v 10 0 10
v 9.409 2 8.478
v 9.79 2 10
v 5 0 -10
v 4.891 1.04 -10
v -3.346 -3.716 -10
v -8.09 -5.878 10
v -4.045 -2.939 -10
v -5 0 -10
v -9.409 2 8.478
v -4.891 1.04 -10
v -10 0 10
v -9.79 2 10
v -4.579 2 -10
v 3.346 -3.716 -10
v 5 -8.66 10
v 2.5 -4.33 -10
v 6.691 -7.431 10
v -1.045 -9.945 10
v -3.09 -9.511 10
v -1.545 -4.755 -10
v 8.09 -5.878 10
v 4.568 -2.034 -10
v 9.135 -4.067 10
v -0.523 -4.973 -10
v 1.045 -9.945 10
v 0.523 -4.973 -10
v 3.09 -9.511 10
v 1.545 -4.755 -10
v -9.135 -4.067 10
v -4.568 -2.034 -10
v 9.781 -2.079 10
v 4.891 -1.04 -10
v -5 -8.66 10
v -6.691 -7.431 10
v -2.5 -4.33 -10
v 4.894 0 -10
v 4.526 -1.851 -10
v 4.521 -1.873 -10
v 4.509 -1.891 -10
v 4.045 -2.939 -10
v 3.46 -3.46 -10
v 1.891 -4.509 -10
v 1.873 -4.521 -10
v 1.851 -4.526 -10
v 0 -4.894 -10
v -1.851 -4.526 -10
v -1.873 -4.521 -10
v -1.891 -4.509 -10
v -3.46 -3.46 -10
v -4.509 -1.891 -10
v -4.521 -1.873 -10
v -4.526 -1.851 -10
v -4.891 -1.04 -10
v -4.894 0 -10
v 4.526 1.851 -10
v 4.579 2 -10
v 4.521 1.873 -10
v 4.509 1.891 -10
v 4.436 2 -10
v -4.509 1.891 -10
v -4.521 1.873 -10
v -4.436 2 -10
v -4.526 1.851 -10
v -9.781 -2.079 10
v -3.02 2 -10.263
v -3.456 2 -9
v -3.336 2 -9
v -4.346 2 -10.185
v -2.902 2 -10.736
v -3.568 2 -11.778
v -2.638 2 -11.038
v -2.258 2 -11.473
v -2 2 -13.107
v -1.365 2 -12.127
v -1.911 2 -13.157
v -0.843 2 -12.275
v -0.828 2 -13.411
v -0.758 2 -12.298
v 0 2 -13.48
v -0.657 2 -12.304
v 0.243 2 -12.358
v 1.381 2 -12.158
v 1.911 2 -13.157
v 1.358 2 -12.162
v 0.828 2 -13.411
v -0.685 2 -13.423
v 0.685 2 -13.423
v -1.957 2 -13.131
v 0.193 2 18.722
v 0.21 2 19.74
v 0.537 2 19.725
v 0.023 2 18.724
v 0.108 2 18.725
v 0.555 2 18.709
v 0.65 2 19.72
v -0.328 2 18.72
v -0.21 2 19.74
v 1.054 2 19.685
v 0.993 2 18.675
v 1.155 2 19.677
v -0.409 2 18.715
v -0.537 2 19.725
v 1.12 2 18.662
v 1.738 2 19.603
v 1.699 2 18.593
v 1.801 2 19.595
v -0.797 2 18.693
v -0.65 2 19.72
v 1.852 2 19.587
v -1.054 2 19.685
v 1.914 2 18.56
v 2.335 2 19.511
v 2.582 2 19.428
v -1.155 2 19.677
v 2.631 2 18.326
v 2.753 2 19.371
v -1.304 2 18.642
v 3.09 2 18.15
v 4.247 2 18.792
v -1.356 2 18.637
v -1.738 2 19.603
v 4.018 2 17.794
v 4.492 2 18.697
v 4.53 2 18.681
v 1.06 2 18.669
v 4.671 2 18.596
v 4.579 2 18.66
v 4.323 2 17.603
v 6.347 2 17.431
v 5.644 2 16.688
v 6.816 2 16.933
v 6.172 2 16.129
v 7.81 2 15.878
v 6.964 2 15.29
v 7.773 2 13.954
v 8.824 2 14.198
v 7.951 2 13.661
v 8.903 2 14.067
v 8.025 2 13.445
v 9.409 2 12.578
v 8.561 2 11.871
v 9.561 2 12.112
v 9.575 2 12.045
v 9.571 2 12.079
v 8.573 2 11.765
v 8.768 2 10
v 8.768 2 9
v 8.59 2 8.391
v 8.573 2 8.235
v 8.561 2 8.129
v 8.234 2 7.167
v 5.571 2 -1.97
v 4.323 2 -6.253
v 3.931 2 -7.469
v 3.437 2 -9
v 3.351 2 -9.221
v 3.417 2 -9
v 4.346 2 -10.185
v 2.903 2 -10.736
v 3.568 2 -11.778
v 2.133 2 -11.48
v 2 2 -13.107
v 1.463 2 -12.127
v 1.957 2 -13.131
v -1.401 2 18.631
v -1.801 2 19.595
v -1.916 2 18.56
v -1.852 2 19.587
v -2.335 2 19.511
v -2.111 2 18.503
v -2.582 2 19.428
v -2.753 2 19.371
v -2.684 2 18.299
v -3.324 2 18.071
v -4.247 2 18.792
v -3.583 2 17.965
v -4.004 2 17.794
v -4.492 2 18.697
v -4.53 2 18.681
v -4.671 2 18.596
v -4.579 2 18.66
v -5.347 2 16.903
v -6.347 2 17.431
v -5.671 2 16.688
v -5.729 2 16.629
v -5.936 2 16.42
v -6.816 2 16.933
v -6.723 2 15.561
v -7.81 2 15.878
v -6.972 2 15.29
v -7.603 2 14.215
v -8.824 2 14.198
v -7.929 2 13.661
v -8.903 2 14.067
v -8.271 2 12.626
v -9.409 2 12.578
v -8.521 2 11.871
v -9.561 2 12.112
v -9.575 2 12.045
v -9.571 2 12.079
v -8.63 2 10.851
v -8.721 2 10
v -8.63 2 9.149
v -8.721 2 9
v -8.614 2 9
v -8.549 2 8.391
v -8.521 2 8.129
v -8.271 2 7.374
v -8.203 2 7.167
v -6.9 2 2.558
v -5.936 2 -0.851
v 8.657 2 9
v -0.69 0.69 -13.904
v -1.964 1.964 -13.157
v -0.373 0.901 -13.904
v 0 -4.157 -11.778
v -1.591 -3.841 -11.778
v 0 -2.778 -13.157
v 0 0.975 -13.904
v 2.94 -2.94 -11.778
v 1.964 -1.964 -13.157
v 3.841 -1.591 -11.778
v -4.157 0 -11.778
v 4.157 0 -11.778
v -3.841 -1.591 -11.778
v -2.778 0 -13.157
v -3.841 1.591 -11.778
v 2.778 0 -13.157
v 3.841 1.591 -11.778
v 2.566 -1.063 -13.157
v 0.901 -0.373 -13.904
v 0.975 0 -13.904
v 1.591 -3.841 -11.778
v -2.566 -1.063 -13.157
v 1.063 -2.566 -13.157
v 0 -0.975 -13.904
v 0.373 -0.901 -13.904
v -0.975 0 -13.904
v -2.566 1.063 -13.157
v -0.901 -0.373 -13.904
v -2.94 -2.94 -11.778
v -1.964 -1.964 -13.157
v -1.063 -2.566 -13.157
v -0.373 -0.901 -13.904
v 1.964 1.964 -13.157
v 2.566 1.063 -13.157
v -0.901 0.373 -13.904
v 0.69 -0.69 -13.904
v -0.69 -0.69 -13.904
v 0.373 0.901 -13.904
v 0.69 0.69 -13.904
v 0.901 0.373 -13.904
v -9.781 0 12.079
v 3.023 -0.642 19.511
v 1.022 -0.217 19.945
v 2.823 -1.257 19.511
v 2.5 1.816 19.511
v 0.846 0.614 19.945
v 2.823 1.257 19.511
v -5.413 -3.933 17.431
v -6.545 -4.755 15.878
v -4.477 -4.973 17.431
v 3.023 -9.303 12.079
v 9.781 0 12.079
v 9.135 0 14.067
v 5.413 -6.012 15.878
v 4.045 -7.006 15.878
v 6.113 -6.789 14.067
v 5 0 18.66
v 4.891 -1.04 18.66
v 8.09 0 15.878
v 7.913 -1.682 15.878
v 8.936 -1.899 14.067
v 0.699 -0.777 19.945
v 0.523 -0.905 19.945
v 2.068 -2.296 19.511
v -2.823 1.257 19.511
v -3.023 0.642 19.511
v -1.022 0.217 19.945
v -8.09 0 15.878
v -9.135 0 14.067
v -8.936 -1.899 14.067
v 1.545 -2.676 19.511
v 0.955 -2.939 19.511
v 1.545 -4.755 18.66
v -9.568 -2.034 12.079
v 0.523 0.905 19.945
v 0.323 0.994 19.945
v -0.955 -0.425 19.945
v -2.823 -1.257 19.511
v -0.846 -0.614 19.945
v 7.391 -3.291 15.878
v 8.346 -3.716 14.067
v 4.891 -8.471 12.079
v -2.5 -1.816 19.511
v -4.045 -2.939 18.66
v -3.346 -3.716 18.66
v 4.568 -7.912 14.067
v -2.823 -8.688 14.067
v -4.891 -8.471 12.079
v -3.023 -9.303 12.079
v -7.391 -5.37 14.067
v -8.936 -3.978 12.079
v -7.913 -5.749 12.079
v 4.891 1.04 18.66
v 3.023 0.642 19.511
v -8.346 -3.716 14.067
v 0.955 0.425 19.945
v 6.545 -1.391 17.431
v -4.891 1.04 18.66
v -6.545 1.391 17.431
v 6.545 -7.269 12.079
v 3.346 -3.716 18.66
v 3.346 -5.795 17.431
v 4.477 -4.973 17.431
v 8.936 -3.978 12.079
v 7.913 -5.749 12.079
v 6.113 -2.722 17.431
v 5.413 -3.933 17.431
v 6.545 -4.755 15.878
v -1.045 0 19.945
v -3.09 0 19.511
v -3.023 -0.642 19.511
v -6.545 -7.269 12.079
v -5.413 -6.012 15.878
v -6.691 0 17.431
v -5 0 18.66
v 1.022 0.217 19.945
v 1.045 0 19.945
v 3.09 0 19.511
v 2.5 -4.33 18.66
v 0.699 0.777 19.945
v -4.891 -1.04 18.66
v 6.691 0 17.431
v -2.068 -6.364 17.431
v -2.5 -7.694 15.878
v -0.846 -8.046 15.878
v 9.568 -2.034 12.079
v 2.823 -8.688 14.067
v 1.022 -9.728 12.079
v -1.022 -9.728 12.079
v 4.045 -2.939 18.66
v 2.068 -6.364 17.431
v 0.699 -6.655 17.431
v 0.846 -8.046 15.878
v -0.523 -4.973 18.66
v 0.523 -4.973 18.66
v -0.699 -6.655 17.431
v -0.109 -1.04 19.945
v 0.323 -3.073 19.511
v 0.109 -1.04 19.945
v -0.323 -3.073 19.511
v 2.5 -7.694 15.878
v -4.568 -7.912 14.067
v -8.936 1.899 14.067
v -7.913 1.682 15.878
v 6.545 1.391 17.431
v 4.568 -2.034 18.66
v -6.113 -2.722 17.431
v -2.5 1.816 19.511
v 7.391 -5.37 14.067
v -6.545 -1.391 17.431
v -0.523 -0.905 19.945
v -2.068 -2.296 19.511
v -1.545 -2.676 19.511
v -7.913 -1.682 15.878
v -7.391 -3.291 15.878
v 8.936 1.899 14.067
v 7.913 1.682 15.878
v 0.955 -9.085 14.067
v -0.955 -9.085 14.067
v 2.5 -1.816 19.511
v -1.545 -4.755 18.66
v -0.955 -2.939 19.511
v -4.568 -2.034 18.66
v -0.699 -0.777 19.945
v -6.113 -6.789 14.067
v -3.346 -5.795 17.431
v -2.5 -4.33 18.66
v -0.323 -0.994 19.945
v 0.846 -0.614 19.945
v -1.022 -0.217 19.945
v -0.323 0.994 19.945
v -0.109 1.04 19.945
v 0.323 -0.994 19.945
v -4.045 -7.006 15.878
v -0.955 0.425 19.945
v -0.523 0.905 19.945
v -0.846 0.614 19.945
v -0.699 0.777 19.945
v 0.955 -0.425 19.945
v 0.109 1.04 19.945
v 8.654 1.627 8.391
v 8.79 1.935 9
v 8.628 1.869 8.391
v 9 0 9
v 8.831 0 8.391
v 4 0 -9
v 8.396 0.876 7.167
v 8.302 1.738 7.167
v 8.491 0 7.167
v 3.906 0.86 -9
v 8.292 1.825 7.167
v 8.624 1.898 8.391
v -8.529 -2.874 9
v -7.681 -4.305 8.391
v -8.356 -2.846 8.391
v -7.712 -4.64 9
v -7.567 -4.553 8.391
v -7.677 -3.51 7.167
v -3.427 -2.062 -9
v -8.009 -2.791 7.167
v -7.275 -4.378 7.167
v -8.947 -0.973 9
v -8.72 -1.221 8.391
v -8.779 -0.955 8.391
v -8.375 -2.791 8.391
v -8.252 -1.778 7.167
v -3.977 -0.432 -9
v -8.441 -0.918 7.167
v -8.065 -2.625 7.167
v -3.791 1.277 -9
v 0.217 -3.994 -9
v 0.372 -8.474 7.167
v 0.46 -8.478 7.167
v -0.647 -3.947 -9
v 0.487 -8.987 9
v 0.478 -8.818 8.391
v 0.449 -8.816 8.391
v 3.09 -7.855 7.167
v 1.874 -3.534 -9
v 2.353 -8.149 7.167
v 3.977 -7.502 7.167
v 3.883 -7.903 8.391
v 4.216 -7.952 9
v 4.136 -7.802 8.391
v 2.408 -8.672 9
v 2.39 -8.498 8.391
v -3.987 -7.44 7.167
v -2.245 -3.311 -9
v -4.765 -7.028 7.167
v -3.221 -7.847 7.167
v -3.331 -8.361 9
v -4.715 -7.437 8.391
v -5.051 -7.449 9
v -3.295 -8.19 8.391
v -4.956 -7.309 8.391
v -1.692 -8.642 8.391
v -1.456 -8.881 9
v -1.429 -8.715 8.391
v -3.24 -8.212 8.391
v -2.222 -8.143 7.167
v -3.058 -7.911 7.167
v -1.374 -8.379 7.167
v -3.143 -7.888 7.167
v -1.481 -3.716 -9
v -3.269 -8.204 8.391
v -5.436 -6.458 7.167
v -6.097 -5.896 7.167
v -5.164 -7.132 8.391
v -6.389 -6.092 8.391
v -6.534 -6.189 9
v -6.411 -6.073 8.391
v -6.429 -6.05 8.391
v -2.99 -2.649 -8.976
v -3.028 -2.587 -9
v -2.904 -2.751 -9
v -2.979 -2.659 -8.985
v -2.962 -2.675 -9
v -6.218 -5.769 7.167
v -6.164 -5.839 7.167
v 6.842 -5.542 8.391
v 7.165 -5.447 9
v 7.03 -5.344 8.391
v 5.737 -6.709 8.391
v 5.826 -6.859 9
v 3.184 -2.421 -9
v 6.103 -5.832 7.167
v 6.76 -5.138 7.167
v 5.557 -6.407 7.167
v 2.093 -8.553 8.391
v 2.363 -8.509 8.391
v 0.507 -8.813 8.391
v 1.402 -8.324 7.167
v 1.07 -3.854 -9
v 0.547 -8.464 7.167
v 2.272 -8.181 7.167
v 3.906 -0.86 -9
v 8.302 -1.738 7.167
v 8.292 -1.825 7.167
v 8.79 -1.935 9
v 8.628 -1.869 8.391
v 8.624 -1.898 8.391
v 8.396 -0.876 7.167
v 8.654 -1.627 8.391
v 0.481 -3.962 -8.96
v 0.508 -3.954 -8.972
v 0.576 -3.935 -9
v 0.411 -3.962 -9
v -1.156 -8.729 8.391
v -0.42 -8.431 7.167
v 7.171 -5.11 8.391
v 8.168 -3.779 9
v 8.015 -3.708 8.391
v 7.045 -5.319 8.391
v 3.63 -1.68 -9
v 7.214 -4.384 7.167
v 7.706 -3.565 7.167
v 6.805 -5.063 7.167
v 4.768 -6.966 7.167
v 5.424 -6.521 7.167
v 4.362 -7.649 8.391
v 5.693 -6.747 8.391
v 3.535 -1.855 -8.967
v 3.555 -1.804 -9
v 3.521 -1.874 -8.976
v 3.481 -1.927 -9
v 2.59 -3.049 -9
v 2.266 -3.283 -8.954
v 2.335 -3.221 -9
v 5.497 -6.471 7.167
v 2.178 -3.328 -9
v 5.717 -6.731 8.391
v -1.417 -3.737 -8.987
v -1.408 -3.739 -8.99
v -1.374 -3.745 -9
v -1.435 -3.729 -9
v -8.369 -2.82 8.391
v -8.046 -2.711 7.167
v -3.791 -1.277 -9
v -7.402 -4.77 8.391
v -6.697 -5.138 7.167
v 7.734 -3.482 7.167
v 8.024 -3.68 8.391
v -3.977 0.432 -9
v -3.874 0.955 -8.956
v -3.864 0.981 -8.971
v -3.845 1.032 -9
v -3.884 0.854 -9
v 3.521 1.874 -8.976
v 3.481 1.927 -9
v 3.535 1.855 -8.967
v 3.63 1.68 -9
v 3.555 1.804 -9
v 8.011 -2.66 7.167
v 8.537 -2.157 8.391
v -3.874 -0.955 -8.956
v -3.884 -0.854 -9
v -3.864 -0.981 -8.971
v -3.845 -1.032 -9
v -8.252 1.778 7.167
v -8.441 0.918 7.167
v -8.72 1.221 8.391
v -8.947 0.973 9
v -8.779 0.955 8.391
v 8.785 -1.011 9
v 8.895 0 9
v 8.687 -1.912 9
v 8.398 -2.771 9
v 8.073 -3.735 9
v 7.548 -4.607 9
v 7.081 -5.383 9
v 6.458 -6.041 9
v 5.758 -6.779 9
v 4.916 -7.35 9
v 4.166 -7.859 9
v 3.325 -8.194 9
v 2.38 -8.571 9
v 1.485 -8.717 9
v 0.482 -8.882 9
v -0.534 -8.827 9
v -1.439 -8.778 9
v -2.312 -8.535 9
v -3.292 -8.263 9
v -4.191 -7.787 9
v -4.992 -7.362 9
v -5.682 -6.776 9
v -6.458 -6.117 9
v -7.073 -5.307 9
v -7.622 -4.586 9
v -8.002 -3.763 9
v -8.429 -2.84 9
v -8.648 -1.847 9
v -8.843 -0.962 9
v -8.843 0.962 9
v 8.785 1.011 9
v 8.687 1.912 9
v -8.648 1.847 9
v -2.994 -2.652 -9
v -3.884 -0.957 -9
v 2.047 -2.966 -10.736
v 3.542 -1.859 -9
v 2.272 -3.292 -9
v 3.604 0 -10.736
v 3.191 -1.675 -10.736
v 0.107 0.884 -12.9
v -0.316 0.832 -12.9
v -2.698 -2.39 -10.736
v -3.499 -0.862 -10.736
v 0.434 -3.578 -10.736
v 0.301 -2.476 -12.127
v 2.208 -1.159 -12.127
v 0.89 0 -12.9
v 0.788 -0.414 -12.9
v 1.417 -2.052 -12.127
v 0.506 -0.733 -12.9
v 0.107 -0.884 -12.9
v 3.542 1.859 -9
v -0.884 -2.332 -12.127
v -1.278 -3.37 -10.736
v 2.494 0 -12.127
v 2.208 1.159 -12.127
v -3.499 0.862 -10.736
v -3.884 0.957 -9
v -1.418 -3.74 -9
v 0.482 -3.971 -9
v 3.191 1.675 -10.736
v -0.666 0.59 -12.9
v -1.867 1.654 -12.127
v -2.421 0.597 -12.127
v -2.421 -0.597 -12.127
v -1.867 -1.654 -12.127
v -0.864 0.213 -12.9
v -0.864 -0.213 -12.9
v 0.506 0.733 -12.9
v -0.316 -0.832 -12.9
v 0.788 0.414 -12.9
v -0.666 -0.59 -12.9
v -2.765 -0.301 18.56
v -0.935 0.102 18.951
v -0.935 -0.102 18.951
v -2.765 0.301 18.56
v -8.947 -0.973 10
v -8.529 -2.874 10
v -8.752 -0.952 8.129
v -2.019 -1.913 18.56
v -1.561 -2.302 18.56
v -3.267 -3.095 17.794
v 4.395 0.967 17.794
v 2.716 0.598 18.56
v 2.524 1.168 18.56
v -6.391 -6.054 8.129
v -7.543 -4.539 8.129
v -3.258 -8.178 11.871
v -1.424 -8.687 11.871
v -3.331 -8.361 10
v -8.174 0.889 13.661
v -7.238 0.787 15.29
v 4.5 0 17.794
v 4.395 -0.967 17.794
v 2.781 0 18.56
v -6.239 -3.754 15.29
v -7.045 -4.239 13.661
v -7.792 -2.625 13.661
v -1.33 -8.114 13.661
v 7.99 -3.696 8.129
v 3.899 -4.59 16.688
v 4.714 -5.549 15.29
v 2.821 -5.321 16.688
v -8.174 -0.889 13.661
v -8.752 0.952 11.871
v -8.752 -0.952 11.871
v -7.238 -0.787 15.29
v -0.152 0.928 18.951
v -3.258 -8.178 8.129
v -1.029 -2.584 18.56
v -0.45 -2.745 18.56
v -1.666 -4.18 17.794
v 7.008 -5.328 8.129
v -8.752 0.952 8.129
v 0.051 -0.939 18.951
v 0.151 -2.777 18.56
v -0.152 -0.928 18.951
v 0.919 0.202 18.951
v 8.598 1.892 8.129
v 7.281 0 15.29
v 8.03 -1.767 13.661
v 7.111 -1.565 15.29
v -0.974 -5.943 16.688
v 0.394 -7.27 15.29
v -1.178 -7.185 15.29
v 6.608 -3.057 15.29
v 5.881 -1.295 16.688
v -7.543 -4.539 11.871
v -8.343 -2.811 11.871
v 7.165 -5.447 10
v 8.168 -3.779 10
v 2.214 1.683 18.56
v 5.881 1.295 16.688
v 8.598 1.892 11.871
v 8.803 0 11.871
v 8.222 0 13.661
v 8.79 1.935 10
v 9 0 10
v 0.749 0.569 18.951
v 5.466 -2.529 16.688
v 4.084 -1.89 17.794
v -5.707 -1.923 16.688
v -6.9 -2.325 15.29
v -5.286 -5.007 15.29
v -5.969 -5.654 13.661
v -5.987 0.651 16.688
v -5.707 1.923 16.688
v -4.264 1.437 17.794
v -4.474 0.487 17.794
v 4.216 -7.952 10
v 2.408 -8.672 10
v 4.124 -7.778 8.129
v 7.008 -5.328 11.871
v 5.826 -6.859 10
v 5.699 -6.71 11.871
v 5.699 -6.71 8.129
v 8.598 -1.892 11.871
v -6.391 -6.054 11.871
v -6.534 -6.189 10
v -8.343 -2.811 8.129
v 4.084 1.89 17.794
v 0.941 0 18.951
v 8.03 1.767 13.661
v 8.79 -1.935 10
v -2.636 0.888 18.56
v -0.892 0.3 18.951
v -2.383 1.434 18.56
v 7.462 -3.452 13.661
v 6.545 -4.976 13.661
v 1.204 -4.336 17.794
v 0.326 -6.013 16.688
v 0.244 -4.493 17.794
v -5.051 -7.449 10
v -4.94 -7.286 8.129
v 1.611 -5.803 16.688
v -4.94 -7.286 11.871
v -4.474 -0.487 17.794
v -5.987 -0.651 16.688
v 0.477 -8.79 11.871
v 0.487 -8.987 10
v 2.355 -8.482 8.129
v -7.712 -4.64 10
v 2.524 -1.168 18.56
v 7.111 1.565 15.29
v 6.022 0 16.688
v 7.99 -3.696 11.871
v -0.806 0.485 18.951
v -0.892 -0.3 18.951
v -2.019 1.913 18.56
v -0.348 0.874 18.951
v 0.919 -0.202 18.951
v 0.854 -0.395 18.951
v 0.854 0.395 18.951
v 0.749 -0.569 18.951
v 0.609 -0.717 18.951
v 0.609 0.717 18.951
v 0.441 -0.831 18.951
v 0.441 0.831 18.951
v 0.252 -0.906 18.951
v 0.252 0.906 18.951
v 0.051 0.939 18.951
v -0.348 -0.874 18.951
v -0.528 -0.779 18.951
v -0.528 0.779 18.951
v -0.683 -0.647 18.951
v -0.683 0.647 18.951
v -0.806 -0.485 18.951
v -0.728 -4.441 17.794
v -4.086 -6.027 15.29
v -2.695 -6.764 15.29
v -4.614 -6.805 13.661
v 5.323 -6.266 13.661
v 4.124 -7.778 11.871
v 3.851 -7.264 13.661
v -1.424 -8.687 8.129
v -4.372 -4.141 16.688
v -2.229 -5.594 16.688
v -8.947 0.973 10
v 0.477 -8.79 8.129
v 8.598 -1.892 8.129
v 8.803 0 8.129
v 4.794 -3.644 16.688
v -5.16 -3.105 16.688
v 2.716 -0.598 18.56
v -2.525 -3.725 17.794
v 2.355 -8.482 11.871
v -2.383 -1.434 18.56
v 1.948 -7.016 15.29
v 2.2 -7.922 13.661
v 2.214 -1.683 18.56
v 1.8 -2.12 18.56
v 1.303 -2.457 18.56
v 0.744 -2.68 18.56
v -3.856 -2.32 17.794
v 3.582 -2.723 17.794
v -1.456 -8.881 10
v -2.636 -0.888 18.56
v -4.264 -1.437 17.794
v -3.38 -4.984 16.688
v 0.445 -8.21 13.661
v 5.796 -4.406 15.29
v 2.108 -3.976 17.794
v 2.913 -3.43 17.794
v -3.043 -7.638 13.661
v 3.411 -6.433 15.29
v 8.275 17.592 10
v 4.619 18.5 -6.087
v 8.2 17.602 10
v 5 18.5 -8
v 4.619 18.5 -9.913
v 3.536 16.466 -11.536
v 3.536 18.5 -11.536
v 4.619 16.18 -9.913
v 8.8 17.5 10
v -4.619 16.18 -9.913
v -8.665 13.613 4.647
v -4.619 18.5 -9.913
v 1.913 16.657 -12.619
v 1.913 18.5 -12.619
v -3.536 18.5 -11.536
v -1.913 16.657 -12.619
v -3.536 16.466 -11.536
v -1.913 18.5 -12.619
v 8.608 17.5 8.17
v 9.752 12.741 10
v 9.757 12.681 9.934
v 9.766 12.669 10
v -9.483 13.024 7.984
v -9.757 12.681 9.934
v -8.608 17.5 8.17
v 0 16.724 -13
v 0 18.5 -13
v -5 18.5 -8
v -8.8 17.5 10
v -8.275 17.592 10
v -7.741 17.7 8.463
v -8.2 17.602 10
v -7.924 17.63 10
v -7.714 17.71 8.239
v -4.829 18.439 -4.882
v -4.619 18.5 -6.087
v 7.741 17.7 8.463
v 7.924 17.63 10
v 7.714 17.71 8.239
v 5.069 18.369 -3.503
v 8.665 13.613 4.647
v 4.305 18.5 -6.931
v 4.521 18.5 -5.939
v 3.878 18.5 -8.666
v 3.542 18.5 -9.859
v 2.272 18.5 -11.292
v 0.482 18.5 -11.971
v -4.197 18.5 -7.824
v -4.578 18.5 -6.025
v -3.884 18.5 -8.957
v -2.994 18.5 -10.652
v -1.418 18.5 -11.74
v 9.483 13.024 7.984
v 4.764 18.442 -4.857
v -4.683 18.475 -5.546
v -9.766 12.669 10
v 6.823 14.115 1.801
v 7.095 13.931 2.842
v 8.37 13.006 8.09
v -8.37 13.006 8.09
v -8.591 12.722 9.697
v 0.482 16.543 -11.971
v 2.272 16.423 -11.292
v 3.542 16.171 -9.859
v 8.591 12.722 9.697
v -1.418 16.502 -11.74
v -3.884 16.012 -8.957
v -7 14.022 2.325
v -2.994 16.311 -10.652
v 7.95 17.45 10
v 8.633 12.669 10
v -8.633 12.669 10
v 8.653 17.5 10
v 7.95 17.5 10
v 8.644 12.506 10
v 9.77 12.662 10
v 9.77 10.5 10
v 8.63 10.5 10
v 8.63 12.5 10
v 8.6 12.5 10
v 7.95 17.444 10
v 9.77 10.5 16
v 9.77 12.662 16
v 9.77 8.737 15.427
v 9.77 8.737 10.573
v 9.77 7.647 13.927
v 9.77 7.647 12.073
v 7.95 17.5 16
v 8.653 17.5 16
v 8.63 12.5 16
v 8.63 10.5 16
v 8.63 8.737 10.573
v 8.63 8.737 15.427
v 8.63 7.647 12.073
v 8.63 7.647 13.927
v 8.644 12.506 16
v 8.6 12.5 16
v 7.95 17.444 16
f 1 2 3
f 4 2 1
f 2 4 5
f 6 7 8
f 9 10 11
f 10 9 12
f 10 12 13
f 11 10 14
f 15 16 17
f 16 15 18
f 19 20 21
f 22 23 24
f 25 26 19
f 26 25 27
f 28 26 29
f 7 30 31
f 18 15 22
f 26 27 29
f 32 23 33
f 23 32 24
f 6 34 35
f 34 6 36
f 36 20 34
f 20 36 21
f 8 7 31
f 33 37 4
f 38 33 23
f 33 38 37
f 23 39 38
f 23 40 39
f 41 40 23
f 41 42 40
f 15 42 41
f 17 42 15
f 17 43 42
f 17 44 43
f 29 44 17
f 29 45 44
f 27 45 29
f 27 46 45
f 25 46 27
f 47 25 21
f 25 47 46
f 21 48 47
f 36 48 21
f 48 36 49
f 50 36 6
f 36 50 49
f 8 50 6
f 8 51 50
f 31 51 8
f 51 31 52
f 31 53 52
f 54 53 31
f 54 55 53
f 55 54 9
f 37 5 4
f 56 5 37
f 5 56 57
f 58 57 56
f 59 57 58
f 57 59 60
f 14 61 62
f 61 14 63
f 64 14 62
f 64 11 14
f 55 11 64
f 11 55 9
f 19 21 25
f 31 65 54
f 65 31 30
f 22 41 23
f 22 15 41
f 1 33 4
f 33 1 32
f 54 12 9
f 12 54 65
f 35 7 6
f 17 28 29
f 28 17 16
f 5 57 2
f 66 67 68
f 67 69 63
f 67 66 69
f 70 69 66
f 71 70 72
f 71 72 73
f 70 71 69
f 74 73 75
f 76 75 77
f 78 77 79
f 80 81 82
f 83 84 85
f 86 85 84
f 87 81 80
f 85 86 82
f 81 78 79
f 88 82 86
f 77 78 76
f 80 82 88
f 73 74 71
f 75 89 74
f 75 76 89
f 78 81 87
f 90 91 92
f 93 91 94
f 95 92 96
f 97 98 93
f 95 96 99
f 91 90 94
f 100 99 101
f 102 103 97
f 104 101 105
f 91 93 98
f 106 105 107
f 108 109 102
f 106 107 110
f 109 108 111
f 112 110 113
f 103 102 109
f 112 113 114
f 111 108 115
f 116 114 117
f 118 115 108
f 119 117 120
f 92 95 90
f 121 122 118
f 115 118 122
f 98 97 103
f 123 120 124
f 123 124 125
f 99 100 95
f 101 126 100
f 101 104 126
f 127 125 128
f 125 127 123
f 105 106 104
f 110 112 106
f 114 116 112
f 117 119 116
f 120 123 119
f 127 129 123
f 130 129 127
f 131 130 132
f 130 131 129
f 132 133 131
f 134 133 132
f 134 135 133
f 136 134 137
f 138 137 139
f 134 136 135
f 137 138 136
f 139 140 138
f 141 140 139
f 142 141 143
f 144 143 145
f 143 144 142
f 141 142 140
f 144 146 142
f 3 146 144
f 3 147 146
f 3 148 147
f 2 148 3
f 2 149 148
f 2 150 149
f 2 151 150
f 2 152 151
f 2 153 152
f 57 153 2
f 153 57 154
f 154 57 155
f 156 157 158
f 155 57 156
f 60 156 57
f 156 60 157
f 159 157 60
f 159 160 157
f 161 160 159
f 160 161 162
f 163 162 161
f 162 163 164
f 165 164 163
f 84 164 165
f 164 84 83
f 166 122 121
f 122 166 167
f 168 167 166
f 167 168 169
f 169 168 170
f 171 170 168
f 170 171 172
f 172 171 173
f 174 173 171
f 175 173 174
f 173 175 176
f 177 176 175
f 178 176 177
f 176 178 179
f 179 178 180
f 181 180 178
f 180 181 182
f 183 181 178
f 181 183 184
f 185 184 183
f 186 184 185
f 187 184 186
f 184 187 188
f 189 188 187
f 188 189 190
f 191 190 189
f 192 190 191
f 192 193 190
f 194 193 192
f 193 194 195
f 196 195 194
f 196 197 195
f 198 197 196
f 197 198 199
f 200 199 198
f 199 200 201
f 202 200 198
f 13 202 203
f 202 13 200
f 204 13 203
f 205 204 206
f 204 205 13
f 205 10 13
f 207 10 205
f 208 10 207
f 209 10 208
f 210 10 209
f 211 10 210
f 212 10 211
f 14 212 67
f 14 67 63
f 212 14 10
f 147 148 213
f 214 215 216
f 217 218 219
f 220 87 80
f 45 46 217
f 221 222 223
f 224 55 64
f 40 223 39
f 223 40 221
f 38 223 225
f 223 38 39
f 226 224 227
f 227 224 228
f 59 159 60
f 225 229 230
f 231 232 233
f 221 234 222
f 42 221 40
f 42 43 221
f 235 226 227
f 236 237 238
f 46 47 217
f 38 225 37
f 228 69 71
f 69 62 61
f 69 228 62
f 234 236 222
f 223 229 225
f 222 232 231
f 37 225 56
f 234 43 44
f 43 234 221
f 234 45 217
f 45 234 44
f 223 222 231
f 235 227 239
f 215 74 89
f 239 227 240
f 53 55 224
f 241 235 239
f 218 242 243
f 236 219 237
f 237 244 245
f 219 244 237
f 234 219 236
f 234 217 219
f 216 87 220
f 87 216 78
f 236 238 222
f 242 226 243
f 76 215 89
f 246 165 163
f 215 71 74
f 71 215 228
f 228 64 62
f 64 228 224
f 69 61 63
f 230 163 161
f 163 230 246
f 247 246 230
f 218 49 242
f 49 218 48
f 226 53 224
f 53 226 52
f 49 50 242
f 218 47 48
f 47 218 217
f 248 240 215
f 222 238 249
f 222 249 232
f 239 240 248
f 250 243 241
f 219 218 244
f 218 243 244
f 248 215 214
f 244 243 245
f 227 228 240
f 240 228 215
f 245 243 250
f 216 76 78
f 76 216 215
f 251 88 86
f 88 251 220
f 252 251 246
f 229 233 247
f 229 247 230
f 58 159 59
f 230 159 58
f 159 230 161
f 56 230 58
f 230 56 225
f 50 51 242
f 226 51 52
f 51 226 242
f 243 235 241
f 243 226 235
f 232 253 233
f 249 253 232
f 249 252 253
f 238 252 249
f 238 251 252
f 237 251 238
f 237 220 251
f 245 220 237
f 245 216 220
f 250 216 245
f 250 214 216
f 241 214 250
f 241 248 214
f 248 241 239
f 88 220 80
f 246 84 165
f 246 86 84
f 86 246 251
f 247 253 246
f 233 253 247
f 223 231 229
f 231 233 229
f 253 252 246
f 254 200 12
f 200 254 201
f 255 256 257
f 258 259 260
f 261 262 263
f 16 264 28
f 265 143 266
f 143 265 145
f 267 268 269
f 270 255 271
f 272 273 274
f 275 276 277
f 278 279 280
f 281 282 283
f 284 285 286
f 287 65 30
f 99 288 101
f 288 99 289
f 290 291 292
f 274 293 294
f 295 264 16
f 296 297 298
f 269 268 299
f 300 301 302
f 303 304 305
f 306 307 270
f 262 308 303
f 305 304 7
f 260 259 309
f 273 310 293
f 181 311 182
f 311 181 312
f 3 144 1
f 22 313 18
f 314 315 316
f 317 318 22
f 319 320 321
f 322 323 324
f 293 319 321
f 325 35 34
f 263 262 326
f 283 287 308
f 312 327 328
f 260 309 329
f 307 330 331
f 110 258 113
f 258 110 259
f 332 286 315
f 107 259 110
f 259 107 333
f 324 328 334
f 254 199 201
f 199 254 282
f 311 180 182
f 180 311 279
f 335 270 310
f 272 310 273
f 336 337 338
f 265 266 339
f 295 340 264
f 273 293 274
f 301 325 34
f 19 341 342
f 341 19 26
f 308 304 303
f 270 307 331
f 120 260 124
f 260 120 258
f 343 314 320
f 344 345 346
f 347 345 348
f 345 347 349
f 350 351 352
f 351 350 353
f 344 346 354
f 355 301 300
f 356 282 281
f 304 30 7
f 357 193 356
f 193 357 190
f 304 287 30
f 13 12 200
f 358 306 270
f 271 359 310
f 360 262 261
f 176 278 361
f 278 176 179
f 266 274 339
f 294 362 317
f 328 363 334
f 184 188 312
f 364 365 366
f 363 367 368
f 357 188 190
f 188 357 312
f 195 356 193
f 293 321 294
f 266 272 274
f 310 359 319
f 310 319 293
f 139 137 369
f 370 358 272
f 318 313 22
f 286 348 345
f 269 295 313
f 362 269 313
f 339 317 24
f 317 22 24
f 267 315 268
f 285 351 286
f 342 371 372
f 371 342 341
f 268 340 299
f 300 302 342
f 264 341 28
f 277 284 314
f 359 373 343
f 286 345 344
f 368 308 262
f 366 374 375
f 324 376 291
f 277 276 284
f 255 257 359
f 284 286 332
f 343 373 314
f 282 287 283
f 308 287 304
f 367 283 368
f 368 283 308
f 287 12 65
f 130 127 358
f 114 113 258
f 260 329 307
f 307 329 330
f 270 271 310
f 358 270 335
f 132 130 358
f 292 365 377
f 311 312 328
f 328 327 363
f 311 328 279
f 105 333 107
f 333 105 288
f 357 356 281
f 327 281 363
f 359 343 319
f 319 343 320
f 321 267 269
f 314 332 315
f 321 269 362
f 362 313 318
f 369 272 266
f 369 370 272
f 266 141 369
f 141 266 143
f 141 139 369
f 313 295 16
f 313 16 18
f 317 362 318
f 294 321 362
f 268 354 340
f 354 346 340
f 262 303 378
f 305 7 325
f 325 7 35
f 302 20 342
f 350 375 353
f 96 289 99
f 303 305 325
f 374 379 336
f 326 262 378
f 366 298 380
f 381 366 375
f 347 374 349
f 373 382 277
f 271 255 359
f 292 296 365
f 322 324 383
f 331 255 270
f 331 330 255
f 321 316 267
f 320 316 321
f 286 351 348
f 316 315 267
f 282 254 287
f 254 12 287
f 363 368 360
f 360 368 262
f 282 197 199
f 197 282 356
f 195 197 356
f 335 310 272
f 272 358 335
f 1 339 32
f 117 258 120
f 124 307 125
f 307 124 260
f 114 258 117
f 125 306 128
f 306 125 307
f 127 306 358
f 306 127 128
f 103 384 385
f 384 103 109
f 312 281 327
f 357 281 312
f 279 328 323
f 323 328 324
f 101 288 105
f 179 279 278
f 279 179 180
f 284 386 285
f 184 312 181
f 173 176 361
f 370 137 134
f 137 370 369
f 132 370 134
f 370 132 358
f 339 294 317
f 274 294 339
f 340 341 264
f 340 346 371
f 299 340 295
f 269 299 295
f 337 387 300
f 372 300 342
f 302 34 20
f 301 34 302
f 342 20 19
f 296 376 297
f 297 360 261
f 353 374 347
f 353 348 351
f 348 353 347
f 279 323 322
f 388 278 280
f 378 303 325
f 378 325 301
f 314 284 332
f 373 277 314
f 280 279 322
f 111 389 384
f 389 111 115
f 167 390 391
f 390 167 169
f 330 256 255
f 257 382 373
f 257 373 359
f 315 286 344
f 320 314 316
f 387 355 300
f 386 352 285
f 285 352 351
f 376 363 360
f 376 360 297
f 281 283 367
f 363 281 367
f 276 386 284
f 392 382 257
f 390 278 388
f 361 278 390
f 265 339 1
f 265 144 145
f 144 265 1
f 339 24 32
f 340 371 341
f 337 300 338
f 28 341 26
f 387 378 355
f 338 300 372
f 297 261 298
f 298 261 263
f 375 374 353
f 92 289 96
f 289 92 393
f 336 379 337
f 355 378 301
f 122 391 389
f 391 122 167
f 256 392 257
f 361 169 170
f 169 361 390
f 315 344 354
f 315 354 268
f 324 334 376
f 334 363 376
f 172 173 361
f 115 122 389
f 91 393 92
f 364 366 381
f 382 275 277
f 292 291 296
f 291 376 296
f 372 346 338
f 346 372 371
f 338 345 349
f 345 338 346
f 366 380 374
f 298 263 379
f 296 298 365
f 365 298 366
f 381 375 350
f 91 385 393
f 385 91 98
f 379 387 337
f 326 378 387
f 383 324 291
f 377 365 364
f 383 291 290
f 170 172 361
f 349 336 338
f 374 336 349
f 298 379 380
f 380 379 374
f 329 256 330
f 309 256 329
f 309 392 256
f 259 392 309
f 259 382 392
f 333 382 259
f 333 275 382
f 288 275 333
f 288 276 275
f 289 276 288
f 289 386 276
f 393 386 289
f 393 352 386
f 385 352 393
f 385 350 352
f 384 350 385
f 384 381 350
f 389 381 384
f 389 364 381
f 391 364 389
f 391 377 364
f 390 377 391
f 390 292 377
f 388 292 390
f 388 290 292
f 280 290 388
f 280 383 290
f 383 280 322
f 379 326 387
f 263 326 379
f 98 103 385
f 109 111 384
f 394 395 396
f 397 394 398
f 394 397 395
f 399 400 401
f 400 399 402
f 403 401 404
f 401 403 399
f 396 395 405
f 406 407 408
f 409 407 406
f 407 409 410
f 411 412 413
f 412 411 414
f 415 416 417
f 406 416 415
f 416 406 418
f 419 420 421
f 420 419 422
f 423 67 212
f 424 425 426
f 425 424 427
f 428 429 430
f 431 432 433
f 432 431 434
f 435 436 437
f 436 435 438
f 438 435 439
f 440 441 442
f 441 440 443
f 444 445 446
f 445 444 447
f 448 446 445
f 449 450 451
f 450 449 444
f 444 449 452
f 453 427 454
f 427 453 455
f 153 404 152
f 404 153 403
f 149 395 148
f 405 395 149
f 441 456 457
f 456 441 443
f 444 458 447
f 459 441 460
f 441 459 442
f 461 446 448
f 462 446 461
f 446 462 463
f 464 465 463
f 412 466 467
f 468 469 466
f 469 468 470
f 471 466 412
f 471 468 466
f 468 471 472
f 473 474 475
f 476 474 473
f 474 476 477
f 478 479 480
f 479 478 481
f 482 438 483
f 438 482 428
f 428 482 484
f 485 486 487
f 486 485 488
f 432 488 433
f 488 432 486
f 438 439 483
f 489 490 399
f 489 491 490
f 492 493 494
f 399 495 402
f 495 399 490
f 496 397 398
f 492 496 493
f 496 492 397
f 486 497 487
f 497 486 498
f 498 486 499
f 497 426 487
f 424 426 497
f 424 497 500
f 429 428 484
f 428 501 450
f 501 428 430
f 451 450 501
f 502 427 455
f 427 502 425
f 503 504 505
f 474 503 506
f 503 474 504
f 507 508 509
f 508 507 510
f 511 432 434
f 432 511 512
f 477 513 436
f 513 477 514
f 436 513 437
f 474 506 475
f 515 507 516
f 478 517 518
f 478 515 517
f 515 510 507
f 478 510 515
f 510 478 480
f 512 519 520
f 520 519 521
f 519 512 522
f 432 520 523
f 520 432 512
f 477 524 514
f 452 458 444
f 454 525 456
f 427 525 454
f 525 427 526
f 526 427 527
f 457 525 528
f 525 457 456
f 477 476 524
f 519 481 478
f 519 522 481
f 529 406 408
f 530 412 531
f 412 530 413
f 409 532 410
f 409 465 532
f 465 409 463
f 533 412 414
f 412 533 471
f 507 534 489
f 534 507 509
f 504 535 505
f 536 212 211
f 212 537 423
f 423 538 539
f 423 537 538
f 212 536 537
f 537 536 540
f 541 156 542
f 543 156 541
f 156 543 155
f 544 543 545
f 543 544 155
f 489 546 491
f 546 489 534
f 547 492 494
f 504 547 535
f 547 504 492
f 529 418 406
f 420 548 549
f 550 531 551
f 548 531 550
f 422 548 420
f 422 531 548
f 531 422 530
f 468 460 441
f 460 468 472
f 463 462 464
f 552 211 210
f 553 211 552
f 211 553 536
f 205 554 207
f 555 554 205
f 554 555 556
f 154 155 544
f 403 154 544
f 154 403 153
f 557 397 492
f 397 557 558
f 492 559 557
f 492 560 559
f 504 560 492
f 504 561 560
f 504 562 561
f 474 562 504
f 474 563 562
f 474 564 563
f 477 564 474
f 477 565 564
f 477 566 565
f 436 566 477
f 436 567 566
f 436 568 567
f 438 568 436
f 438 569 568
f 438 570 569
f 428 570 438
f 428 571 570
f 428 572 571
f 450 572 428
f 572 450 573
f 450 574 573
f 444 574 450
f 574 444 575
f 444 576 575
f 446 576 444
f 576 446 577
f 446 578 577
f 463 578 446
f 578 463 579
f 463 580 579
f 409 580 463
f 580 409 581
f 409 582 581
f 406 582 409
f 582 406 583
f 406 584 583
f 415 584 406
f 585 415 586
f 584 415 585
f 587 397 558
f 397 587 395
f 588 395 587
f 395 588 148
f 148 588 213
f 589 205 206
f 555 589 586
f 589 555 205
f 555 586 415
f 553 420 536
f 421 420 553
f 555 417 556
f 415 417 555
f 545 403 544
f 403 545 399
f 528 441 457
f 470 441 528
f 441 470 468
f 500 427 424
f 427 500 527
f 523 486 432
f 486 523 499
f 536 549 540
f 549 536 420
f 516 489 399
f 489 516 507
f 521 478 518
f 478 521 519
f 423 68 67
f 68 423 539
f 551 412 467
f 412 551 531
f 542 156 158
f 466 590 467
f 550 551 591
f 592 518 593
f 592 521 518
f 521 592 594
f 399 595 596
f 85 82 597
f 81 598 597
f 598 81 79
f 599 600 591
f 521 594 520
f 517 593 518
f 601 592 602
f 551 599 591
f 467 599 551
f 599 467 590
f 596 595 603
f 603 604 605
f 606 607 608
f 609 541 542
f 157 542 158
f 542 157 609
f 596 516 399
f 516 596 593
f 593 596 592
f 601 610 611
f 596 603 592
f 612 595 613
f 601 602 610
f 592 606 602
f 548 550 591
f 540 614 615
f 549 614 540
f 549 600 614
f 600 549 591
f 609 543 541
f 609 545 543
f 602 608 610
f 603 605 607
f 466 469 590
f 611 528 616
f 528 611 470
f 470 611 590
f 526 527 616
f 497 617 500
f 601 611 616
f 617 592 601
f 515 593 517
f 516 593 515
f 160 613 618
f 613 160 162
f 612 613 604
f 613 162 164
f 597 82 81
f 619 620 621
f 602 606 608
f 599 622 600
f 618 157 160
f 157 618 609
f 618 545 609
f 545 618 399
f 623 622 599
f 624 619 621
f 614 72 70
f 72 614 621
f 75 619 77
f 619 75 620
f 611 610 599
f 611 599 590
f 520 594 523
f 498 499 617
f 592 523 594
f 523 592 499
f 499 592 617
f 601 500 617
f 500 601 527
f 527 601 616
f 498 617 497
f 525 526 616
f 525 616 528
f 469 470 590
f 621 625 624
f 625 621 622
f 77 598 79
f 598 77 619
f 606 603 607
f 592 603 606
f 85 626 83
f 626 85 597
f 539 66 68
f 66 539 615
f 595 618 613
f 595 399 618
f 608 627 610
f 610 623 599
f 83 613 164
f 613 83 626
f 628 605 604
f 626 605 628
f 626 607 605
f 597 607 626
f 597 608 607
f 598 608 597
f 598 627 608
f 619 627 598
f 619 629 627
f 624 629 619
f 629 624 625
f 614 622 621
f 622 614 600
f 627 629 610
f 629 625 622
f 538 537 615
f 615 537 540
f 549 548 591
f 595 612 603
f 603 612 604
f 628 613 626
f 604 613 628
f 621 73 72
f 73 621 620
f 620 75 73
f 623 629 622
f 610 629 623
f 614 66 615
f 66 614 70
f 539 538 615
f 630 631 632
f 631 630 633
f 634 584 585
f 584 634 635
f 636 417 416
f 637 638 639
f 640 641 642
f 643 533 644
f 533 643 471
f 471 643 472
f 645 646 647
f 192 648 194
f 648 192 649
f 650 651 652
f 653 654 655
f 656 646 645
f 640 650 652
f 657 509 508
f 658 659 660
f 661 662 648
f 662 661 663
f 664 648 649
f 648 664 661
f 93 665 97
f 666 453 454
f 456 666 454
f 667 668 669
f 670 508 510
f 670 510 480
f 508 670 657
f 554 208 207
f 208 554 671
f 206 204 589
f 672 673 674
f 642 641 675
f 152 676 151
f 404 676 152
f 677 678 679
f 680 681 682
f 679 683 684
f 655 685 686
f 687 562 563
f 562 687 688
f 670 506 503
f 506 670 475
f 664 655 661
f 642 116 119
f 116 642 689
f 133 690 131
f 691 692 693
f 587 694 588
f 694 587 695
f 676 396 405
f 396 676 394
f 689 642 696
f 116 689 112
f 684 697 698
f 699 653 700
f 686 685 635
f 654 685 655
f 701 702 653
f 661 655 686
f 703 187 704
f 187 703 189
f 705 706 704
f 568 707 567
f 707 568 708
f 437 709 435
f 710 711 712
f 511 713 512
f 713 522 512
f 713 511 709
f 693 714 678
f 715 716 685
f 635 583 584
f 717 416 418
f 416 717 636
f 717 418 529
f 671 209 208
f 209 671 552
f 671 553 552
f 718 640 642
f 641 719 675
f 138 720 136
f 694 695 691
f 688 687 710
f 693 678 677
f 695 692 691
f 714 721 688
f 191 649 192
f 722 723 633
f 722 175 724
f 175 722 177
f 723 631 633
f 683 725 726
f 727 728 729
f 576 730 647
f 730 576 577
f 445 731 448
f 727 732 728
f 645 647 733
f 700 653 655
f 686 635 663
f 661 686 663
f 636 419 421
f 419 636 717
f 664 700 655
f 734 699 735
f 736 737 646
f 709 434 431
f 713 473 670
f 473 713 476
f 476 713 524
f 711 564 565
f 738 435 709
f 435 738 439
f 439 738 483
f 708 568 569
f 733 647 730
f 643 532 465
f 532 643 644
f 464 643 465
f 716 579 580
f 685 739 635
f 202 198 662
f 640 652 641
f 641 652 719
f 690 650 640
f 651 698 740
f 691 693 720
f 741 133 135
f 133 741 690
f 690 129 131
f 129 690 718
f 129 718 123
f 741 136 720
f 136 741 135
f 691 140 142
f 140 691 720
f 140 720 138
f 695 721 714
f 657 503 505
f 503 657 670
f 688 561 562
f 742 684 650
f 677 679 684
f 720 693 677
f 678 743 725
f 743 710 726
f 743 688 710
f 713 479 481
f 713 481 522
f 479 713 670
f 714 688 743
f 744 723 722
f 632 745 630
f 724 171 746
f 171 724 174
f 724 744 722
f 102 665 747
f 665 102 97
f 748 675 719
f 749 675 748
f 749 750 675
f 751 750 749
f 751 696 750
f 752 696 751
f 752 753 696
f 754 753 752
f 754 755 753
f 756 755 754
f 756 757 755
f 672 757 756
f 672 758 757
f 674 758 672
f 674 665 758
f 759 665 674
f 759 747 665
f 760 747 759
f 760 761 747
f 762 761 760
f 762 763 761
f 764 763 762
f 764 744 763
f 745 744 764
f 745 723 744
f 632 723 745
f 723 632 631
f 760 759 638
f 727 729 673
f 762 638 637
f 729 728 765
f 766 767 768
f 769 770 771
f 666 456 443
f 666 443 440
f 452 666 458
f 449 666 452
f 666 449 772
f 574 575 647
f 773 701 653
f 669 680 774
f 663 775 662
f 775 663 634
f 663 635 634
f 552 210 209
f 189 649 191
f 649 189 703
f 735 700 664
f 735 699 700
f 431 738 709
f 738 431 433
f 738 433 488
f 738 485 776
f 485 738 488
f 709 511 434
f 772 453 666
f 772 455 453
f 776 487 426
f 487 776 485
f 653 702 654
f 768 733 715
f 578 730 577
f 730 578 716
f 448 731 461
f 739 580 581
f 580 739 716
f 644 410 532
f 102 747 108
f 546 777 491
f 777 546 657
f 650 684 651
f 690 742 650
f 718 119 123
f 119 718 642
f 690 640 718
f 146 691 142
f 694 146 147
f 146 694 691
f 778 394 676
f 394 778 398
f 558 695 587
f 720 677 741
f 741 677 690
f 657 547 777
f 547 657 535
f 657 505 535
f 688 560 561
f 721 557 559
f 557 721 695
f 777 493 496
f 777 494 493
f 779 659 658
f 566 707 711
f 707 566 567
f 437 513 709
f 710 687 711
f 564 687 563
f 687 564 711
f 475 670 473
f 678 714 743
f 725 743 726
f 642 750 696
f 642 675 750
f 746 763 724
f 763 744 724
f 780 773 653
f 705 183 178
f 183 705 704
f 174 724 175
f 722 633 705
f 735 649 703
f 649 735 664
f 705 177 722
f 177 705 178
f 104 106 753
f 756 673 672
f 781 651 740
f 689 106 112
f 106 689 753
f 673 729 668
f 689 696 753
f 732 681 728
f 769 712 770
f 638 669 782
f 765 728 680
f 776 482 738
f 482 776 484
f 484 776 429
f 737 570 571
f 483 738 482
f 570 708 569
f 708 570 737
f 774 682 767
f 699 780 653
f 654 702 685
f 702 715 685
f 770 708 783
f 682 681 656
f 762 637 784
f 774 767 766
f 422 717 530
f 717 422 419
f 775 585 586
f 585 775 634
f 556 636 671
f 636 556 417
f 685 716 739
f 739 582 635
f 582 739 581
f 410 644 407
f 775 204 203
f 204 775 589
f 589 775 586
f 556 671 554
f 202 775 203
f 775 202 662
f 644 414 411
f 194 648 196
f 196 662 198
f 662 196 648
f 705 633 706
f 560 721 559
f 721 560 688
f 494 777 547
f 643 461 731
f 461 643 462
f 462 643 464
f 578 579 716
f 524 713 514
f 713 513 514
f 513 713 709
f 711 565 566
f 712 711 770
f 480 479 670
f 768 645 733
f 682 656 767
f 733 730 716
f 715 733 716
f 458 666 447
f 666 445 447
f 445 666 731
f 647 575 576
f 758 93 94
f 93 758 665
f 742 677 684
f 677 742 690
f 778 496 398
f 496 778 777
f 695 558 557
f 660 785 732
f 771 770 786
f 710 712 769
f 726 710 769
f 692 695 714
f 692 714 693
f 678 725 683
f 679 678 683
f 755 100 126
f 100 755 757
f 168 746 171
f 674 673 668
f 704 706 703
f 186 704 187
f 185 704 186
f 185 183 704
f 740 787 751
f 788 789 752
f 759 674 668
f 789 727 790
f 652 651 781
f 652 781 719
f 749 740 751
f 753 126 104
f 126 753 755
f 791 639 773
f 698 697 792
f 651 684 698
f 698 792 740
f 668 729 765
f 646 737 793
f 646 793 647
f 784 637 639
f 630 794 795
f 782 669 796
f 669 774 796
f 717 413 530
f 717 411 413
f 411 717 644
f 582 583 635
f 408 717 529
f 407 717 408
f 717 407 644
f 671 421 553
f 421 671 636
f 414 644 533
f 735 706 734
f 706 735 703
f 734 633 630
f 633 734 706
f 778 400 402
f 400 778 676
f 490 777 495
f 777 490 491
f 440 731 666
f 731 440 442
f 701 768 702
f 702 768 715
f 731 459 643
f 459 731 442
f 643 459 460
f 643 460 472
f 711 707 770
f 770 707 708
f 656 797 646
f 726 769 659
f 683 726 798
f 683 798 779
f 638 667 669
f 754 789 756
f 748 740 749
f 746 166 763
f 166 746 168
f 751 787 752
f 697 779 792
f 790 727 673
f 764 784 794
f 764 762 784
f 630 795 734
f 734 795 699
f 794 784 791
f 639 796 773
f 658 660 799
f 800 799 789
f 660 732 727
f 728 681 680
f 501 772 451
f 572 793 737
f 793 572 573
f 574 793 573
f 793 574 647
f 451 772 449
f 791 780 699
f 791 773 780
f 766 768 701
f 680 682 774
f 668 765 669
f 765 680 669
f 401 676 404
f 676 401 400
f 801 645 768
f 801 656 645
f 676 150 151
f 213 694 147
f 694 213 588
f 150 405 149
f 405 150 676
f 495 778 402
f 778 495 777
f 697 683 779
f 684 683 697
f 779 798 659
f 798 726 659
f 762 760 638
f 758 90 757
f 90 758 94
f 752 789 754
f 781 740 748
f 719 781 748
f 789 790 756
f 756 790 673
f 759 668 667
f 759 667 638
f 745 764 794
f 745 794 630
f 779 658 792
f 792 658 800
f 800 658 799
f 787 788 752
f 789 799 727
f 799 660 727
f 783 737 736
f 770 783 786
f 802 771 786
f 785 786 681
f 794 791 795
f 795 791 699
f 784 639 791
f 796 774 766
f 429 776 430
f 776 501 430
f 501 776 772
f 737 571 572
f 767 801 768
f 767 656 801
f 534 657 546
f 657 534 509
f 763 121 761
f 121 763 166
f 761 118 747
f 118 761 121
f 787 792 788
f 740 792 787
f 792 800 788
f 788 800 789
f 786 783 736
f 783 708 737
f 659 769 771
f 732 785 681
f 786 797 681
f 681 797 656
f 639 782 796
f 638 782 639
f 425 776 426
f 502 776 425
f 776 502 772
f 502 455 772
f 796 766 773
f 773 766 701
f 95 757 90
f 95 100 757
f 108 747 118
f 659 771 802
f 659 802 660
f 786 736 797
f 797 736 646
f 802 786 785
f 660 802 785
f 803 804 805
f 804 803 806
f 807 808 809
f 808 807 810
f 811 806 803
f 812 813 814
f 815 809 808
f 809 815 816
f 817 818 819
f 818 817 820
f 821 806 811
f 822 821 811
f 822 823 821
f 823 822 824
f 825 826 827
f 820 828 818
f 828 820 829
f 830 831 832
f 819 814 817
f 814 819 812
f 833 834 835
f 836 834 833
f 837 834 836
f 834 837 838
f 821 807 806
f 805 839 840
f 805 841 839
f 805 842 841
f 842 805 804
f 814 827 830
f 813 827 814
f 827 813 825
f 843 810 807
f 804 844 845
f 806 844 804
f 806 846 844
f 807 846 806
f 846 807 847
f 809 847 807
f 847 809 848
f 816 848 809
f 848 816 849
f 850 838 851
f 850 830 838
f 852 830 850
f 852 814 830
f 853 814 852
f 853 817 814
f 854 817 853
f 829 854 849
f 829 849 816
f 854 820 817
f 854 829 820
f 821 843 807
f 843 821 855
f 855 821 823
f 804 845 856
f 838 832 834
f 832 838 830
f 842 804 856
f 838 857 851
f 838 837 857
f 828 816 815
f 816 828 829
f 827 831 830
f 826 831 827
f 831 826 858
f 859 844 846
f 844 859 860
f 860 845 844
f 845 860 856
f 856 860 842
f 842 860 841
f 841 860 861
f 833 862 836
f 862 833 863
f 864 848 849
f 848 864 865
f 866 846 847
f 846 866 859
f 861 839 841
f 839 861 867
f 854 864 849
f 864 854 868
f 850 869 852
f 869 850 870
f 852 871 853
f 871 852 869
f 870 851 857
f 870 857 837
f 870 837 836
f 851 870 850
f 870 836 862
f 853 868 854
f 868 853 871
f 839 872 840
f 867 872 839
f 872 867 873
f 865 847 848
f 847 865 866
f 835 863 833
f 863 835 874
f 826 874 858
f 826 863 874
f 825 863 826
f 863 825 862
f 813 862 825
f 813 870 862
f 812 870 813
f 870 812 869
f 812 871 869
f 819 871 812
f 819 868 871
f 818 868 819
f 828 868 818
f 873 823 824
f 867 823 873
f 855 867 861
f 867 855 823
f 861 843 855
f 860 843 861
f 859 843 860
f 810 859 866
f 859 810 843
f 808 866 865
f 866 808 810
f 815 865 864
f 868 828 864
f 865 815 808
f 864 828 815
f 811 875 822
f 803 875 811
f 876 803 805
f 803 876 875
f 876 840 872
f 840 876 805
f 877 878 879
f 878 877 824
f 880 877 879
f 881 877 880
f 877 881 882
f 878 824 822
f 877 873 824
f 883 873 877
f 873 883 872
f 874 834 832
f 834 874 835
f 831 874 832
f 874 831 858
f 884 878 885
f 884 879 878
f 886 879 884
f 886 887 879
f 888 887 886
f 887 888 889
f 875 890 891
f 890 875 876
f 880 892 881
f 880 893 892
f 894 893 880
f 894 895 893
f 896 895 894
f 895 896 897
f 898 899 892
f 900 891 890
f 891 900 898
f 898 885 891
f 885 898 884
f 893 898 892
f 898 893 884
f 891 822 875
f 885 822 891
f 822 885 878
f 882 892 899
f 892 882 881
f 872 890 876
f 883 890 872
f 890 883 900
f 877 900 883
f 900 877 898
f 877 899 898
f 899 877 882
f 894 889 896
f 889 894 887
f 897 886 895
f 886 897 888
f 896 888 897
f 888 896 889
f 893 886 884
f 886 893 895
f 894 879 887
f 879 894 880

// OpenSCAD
//skull
difference(){
    union(){
        difference(){
                
            cylinder(h = 20, r1 = 5, r2 = 10, center = true);
            translate([-10,2,-20])
                cube([20,10,40]); 
        }    

        difference(){
                
            
            translate([0,0,-9])
                difference(){
                    sphere(5); 
                    translate([0,0,4])
                        cube(size=10, center = true);
                }
            translate([-10,2,-20])
                cube([20,10,40]); 
        }    

        difference(){
                
            translate([0,0,10])
                difference(){
                    sphere(10); 
                    translate([0,0,-10]) cube(size=20, center = true);
                }
            translate([-10,2,-20]) cube([20,10,40]); 
        }   
    }
    union(){ 
        cylinder(h = 18, r1 = 4, r2 = 9, center = true);   
        translate([0,0,-9])  sphere(4);   
        translate([0,0,10])  sphere(9);    
    }
}

//jaw

//final position
//translate([0,31,0])

translate([0,45,0])
    union (){
        rotate([90,0,0]){ 
             difference(){
                difference(){
                    difference(){
                        translate(0,0,0)
                            hull() {
                                translate([0,10,30]) cylinder(h = 5, r1 = 8.8, r2 = 9.8, center = true);
                                //translate([0,10,30]) circle(9.7);
                                //translate([0,-8.5,30]) circle(5);
                                translate([0,-8,28]) cylinder(h = 3, r1 = 5, r2 = 5, center = true);
    
                            }
                        translate(0,0,0)
                            hull() {
                                translate([0,10,30]) cylinder(h = 7, r1 = 7.8, r2 = 8.8, center = true);
                                //translate([0,10,30]) circle(9.7);
                                //translate([0,-8.5,30]) circle(5);
                                translate([0,-8,28]) cylinder(h = 4, r1 = 4, r2 = 4, center = true);
                    
                            }
                        
                    }
                    translate([-10,-15,33]) rotate(a=-80,v=[1,0,0]) cube([20,5,25]); 
                }
                translate([-10,10,25])   cube([20,10,10]); 
            } 
            difference(){
                union(){
                    difference(){
                        union(){
                            difference(){
                                translate([8.63 ,10,27.5]) cube([1.14,6,10]);
                                translate([8.63 ,9,27.4]) rotate(a=13,v=[0,1,0]) cube([2,8,10]); 
                            }
                            difference(){
                                translate([7.95 ,10,27.5]) cube([1.75,6,5]);
                                translate([8.63 ,9,27.4]) rotate(a=13,v=[0,1,0]) cube([2,8,10]); 
                            }
                        }
                        translate([5.55,8.5,24.85]) rotate(a=8,v=[0,1,0]) cube([2,10,8]); 
                    }
                }  
                
                translate([10,10,37.5]) rotate(a=-90,v=[1,0,0]) rotate(a=-90,v=[0,1,0]) difference(){
                    translate([-1,-1,-2]) cube([8,4,4]); 
                    translate([3,3,-1]) cylinder(h = 8, r = 3);
                }    
            }
        } 
    }    
         
